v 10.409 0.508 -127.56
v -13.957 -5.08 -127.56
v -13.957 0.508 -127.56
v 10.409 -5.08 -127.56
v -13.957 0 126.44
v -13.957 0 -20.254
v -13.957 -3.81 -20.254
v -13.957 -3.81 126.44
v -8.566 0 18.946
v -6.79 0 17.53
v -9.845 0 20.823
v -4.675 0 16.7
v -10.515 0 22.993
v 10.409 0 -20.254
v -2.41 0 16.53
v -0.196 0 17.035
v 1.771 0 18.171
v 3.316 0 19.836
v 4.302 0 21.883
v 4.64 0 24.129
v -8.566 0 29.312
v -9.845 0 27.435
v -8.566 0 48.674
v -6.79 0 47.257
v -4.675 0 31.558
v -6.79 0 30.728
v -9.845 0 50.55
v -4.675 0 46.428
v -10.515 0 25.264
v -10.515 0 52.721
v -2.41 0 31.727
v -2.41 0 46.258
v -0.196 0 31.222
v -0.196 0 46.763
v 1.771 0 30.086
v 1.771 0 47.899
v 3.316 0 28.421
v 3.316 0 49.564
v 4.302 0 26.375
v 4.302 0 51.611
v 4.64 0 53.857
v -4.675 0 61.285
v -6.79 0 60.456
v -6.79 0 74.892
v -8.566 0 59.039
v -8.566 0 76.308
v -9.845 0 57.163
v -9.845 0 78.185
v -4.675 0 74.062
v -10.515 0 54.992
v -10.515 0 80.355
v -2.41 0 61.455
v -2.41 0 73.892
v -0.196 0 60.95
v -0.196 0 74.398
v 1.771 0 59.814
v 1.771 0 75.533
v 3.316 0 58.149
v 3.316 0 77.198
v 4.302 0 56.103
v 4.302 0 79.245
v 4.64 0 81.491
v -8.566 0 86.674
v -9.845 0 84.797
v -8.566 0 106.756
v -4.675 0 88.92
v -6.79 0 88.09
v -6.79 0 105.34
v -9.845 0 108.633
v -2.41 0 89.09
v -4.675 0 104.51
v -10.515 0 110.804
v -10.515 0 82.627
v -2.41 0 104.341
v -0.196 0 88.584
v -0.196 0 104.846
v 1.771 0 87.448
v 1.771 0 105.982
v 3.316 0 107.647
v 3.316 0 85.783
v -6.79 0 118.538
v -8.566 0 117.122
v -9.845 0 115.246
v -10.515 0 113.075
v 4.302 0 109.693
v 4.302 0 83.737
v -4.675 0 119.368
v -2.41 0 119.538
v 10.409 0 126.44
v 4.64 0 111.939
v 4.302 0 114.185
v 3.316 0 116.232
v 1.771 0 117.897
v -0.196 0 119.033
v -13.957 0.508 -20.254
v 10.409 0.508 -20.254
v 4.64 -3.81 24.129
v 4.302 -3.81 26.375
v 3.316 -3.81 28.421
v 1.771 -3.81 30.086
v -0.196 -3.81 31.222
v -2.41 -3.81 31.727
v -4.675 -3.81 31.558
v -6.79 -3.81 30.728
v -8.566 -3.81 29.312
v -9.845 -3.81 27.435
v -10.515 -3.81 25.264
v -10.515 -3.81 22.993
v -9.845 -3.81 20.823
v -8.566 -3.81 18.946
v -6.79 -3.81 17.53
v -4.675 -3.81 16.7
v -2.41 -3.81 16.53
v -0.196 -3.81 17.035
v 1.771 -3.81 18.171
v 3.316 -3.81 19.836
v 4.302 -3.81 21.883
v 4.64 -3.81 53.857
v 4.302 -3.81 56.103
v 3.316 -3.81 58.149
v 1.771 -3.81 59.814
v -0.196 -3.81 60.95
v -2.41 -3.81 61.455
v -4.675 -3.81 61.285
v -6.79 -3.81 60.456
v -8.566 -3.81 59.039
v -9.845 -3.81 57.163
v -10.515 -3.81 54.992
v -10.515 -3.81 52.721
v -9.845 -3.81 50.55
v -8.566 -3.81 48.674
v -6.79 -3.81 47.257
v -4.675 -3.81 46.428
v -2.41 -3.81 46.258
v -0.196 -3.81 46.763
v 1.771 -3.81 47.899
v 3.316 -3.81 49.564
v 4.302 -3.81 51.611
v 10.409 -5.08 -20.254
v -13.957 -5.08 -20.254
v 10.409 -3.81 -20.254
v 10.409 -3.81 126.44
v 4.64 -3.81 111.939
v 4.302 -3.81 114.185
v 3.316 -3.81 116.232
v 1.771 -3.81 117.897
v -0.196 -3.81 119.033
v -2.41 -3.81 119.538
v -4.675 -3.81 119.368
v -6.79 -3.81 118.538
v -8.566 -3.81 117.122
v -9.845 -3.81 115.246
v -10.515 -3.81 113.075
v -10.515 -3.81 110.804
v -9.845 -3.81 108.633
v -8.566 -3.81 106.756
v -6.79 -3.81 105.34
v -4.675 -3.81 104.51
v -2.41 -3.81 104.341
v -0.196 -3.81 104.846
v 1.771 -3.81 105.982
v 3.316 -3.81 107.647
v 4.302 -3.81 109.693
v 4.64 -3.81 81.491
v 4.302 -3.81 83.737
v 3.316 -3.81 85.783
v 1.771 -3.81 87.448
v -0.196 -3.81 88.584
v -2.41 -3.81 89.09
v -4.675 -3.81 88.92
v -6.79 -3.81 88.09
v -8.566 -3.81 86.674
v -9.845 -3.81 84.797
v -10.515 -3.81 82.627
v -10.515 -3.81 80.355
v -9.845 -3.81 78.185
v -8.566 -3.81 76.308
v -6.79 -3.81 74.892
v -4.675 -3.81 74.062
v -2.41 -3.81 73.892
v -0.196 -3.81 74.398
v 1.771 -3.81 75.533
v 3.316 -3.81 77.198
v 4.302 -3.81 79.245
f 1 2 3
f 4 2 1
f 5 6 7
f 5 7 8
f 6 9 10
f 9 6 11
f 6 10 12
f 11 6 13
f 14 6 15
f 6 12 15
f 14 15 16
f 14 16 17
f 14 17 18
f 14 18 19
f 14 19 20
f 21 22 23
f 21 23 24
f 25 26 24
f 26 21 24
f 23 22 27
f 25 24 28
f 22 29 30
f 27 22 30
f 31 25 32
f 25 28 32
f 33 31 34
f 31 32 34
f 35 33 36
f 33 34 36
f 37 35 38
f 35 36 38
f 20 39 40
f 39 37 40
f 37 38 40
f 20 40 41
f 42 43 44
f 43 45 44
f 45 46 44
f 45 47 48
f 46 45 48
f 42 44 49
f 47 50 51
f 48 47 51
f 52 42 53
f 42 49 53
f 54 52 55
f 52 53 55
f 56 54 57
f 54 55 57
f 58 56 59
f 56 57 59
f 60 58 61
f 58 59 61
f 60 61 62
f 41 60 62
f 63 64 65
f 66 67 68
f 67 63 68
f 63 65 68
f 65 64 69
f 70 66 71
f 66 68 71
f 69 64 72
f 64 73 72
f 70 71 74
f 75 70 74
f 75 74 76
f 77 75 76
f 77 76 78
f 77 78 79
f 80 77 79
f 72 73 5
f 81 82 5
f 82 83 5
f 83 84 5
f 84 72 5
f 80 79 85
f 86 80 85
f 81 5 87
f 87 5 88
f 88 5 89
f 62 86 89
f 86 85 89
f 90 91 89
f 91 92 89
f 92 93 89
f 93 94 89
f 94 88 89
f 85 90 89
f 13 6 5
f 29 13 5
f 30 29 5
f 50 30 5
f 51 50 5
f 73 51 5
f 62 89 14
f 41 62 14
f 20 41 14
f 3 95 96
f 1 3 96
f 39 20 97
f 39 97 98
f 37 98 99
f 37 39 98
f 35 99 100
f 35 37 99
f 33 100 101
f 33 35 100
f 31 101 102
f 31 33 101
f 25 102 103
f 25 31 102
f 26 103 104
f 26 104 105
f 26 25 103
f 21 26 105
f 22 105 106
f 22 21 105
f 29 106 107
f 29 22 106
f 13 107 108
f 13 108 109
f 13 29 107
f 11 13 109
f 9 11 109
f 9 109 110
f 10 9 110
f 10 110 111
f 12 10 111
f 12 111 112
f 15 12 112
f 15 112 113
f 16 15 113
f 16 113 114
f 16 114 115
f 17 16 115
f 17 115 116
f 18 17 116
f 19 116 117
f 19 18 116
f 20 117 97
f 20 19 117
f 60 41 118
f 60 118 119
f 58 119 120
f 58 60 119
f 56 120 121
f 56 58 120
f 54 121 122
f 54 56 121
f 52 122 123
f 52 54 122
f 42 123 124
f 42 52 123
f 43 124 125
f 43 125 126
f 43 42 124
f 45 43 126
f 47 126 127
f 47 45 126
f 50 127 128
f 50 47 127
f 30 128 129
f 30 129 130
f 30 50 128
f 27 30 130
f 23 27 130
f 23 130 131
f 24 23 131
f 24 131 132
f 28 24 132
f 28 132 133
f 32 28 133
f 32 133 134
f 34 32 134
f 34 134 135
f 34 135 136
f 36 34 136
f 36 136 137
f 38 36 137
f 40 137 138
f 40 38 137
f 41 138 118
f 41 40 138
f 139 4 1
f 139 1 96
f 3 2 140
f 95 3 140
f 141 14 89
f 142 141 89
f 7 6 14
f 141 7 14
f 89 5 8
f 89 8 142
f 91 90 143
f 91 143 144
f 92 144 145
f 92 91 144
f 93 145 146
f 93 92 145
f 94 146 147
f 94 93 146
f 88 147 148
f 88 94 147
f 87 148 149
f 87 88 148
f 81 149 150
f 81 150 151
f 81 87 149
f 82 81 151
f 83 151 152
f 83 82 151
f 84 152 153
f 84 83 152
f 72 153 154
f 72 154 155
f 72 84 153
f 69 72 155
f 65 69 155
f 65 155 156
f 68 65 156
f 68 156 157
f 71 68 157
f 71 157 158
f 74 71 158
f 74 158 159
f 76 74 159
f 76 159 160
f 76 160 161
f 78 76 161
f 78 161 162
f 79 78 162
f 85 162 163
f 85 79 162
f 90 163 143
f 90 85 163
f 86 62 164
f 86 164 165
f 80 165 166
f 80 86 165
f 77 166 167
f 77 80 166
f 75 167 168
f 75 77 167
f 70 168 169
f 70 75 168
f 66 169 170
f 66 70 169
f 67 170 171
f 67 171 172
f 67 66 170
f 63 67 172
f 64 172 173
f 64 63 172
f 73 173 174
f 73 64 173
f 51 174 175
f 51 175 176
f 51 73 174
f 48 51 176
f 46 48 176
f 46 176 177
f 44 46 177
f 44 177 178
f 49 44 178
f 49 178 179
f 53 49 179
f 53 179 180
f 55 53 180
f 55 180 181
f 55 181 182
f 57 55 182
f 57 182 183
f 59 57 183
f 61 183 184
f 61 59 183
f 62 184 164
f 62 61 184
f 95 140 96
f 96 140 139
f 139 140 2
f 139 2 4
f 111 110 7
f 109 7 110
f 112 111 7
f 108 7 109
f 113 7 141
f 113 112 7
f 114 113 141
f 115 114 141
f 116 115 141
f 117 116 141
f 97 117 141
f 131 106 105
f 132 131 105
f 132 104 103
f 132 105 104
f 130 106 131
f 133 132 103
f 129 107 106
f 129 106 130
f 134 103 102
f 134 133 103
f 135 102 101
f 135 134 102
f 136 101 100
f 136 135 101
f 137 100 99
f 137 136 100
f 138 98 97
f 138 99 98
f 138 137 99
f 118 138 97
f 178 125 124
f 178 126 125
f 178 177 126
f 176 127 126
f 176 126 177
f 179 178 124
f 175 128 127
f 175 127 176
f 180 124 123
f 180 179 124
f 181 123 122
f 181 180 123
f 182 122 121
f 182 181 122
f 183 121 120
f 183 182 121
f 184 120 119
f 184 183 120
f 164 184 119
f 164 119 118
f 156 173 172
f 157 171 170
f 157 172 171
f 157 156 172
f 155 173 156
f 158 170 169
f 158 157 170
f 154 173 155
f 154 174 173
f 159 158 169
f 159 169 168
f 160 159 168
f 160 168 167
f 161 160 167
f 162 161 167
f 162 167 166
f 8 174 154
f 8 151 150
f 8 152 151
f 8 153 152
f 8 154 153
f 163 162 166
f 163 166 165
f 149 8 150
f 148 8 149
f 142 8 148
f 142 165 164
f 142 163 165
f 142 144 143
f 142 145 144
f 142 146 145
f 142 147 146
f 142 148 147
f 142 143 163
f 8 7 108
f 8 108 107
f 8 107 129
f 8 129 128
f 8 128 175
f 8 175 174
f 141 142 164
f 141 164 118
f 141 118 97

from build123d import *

# Parameters (mm, degrees)
F0_W          = 24.365307
F0_H          = 146.693479
F0_R          = 7.62
F1_DEPTH      = 3.81
F0_H_2        = 107.306521
F2_DEPTH      = 5.08
F2_DEPTH_BACK = 0.508


with BuildPart() as f1:
    # F0 (on Front) → F1 (new body)
    with BuildSketch(Plane.XZ):
        with Locations((-1.773852, 53.093097)):
            Rectangle(F0_W, F0_H)
        with Locations((-2.979757, 24.128733)):
            Circle(F0_R, mode=Mode.SUBTRACT)
        with Locations((-2.979757, 53.856548)):
            Circle(F0_R, mode=Mode.SUBTRACT)
        with Locations((-2.979757, 81.490859)):
            Circle(F0_R, mode=Mode.SUBTRACT)
        with Locations((-2.979757, 111.939309)):
            Circle(F0_R, mode=Mode.SUBTRACT)
    extrude(amount=F1_DEPTH)


with BuildPart() as f2:
    # F0 (on Front) → F2 (new body, two sides)
    with BuildSketch(Plane.XZ) as f2_sk:
        with Locations((-1.773852, -73.906903)):
            Rectangle(F0_W, F0_H_2)
    extrude(amount=F2_DEPTH)
    extrude(f2_sk.sketch, amount=-F2_DEPTH_BACK)


solid = Compound([f1.part, f2.part])
